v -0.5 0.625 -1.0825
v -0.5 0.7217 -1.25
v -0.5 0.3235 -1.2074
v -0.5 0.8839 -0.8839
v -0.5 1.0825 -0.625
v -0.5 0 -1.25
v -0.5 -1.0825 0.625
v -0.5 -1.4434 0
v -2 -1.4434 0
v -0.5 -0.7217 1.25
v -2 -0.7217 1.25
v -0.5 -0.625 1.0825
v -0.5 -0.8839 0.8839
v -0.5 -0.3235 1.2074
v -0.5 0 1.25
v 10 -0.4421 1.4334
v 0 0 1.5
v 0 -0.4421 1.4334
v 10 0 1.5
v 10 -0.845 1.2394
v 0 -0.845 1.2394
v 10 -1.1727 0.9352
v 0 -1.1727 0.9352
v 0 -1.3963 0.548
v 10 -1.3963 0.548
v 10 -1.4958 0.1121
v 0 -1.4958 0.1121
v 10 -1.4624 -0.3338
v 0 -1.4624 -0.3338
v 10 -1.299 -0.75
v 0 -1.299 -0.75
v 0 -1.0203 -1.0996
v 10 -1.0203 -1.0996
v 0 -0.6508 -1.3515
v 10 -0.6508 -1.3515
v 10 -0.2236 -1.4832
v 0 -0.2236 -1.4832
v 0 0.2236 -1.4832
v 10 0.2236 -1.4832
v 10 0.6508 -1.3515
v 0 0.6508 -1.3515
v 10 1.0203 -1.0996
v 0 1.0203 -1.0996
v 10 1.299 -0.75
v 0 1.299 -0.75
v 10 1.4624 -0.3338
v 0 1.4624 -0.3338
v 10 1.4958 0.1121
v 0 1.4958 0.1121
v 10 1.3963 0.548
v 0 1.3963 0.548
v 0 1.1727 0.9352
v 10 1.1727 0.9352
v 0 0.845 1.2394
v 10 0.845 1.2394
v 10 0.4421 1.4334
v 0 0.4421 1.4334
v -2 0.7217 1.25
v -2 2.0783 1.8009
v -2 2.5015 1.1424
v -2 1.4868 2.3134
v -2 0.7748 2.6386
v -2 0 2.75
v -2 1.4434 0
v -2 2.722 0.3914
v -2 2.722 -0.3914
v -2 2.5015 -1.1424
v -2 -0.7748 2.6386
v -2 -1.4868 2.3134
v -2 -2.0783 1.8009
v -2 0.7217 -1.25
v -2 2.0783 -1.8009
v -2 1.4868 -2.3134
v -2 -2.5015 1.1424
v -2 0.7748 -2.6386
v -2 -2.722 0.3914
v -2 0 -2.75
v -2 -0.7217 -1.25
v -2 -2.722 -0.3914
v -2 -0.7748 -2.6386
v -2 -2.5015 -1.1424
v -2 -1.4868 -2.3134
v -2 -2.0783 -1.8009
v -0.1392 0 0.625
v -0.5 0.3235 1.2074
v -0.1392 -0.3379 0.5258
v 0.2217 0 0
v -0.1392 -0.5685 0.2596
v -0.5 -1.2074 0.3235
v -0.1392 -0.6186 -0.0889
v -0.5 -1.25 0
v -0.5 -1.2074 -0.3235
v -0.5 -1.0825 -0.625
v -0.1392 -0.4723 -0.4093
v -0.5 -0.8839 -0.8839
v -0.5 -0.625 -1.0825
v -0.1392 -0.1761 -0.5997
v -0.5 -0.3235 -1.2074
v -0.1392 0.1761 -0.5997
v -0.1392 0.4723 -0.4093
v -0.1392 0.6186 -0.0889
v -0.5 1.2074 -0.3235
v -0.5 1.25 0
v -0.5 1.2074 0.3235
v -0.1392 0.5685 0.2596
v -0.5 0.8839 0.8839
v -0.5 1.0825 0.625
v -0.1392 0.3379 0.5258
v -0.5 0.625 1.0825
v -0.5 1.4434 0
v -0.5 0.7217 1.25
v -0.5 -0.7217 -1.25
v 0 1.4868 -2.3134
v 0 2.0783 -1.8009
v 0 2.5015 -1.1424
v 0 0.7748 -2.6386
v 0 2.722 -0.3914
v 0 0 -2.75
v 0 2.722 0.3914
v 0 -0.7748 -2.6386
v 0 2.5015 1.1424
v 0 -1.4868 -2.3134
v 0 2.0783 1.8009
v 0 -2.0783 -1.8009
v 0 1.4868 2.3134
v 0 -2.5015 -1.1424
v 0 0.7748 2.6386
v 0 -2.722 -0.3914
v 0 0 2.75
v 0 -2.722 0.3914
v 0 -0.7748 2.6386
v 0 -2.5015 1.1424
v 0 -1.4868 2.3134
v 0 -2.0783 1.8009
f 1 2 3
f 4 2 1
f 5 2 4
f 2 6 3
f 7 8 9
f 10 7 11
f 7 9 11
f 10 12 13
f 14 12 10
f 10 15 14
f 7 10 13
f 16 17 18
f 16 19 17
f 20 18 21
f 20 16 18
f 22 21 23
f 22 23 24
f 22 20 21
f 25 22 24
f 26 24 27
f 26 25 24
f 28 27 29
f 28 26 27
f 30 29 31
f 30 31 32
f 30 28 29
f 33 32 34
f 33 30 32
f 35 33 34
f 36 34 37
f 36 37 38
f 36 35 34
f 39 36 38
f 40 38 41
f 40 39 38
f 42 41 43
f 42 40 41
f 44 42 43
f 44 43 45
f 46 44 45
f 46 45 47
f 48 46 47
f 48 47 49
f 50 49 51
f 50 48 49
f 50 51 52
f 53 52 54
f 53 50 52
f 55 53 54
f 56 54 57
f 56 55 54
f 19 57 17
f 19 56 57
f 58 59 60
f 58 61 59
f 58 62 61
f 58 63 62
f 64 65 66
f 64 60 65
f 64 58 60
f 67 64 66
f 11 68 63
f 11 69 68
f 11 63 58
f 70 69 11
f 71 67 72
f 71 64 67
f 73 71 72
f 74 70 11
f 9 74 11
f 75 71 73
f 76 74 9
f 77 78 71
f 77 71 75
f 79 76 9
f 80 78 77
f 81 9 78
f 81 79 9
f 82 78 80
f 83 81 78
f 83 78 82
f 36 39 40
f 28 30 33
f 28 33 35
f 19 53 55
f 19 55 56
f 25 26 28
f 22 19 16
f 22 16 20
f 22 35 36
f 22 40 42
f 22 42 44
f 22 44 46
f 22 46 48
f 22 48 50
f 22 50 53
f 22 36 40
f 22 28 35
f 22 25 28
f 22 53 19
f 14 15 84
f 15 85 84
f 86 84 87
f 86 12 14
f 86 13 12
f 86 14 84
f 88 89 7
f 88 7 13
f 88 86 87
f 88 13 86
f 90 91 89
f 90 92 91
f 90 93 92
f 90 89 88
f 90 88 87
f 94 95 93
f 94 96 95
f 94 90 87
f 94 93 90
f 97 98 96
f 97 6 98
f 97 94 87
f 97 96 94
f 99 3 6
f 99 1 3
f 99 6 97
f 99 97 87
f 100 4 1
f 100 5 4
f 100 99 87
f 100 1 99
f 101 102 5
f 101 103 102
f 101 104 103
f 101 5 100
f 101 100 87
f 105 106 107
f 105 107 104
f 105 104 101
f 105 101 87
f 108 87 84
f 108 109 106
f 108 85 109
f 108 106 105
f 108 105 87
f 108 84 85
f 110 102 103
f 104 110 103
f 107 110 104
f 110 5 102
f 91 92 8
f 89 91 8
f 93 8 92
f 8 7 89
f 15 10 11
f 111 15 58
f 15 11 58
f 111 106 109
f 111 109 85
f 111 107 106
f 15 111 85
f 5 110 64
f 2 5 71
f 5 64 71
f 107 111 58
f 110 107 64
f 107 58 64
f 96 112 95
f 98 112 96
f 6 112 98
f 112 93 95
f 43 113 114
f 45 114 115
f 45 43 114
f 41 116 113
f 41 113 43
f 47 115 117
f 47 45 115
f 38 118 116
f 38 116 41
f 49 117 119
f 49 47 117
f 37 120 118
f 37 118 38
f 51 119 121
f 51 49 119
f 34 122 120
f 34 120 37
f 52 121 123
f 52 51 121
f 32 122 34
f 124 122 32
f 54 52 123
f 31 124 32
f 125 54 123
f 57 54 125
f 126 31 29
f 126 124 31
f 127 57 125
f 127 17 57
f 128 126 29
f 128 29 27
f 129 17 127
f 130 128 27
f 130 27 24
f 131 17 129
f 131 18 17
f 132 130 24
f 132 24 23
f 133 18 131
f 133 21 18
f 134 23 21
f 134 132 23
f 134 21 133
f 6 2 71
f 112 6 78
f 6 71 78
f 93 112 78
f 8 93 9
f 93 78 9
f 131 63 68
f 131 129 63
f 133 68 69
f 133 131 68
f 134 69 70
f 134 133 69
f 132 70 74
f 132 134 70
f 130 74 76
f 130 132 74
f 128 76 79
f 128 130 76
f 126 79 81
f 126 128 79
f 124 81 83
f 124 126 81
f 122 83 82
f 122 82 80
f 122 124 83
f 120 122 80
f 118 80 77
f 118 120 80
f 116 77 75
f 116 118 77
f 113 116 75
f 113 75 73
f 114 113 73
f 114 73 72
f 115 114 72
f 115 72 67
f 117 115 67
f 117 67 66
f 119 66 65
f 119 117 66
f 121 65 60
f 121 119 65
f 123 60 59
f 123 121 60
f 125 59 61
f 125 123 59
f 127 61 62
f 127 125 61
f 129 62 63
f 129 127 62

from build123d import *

# Parameters (mm, degrees)
CUT_EXTRUDE1_DEPTH = 1.5


with BuildPart() as part:
    # Sketch1 → Revolve1 (revolve)
    with BuildSketch(Plane.XY, mode=Mode.PRIVATE) as revolve1_sk:
        Polygon((-2, 0), (-2, 2.75), (0, 2.75), (0, 1.5), (10, 1.5), (10, 0), align=None)
    revolve(revolve1_sk.sketch.rotate(Axis((-22.358139419, 0, 0), (1, 0, 0)), 90), axis=Axis((-22.358139419, 0, 0), (1, 0, 0)))

    # Sketch2 → Cut-Revolve1 (revolve, cut)
    with BuildSketch(Plane(origin=(0, 0, 0), x_dir=(1, 0, 0), z_dir=(0, 1, 0)), mode=Mode.PRIVATE) as cut_revolve1_sk:
        Polygon((-2, 1.25), (-2, 0), (0.221687836, 0), (-0.5, 1.25), align=None)
    revolve(cut_revolve1_sk.sketch.rotate(Axis((-5.673571921, 0, 0), (1, 0, 0)), 180), axis=Axis((-5.673571921, 0, 0), (1, 0, 0)), mode=Mode.SUBTRACT)

    # Sketch3 → Cut-Extrude1 (cut)
    with BuildSketch(Plane.ZY.offset(2)):
        Polygon((0, 1.443375673), (-1.25, 0.721687836), (-1.25, -0.721687836), (0, -1.443375673), (1.25, -0.721687836), (1.25, 0.721687836), align=None)
    extrude(amount=-CUT_EXTRUDE1_DEPTH, mode=Mode.SUBTRACT)


solid = part.part
